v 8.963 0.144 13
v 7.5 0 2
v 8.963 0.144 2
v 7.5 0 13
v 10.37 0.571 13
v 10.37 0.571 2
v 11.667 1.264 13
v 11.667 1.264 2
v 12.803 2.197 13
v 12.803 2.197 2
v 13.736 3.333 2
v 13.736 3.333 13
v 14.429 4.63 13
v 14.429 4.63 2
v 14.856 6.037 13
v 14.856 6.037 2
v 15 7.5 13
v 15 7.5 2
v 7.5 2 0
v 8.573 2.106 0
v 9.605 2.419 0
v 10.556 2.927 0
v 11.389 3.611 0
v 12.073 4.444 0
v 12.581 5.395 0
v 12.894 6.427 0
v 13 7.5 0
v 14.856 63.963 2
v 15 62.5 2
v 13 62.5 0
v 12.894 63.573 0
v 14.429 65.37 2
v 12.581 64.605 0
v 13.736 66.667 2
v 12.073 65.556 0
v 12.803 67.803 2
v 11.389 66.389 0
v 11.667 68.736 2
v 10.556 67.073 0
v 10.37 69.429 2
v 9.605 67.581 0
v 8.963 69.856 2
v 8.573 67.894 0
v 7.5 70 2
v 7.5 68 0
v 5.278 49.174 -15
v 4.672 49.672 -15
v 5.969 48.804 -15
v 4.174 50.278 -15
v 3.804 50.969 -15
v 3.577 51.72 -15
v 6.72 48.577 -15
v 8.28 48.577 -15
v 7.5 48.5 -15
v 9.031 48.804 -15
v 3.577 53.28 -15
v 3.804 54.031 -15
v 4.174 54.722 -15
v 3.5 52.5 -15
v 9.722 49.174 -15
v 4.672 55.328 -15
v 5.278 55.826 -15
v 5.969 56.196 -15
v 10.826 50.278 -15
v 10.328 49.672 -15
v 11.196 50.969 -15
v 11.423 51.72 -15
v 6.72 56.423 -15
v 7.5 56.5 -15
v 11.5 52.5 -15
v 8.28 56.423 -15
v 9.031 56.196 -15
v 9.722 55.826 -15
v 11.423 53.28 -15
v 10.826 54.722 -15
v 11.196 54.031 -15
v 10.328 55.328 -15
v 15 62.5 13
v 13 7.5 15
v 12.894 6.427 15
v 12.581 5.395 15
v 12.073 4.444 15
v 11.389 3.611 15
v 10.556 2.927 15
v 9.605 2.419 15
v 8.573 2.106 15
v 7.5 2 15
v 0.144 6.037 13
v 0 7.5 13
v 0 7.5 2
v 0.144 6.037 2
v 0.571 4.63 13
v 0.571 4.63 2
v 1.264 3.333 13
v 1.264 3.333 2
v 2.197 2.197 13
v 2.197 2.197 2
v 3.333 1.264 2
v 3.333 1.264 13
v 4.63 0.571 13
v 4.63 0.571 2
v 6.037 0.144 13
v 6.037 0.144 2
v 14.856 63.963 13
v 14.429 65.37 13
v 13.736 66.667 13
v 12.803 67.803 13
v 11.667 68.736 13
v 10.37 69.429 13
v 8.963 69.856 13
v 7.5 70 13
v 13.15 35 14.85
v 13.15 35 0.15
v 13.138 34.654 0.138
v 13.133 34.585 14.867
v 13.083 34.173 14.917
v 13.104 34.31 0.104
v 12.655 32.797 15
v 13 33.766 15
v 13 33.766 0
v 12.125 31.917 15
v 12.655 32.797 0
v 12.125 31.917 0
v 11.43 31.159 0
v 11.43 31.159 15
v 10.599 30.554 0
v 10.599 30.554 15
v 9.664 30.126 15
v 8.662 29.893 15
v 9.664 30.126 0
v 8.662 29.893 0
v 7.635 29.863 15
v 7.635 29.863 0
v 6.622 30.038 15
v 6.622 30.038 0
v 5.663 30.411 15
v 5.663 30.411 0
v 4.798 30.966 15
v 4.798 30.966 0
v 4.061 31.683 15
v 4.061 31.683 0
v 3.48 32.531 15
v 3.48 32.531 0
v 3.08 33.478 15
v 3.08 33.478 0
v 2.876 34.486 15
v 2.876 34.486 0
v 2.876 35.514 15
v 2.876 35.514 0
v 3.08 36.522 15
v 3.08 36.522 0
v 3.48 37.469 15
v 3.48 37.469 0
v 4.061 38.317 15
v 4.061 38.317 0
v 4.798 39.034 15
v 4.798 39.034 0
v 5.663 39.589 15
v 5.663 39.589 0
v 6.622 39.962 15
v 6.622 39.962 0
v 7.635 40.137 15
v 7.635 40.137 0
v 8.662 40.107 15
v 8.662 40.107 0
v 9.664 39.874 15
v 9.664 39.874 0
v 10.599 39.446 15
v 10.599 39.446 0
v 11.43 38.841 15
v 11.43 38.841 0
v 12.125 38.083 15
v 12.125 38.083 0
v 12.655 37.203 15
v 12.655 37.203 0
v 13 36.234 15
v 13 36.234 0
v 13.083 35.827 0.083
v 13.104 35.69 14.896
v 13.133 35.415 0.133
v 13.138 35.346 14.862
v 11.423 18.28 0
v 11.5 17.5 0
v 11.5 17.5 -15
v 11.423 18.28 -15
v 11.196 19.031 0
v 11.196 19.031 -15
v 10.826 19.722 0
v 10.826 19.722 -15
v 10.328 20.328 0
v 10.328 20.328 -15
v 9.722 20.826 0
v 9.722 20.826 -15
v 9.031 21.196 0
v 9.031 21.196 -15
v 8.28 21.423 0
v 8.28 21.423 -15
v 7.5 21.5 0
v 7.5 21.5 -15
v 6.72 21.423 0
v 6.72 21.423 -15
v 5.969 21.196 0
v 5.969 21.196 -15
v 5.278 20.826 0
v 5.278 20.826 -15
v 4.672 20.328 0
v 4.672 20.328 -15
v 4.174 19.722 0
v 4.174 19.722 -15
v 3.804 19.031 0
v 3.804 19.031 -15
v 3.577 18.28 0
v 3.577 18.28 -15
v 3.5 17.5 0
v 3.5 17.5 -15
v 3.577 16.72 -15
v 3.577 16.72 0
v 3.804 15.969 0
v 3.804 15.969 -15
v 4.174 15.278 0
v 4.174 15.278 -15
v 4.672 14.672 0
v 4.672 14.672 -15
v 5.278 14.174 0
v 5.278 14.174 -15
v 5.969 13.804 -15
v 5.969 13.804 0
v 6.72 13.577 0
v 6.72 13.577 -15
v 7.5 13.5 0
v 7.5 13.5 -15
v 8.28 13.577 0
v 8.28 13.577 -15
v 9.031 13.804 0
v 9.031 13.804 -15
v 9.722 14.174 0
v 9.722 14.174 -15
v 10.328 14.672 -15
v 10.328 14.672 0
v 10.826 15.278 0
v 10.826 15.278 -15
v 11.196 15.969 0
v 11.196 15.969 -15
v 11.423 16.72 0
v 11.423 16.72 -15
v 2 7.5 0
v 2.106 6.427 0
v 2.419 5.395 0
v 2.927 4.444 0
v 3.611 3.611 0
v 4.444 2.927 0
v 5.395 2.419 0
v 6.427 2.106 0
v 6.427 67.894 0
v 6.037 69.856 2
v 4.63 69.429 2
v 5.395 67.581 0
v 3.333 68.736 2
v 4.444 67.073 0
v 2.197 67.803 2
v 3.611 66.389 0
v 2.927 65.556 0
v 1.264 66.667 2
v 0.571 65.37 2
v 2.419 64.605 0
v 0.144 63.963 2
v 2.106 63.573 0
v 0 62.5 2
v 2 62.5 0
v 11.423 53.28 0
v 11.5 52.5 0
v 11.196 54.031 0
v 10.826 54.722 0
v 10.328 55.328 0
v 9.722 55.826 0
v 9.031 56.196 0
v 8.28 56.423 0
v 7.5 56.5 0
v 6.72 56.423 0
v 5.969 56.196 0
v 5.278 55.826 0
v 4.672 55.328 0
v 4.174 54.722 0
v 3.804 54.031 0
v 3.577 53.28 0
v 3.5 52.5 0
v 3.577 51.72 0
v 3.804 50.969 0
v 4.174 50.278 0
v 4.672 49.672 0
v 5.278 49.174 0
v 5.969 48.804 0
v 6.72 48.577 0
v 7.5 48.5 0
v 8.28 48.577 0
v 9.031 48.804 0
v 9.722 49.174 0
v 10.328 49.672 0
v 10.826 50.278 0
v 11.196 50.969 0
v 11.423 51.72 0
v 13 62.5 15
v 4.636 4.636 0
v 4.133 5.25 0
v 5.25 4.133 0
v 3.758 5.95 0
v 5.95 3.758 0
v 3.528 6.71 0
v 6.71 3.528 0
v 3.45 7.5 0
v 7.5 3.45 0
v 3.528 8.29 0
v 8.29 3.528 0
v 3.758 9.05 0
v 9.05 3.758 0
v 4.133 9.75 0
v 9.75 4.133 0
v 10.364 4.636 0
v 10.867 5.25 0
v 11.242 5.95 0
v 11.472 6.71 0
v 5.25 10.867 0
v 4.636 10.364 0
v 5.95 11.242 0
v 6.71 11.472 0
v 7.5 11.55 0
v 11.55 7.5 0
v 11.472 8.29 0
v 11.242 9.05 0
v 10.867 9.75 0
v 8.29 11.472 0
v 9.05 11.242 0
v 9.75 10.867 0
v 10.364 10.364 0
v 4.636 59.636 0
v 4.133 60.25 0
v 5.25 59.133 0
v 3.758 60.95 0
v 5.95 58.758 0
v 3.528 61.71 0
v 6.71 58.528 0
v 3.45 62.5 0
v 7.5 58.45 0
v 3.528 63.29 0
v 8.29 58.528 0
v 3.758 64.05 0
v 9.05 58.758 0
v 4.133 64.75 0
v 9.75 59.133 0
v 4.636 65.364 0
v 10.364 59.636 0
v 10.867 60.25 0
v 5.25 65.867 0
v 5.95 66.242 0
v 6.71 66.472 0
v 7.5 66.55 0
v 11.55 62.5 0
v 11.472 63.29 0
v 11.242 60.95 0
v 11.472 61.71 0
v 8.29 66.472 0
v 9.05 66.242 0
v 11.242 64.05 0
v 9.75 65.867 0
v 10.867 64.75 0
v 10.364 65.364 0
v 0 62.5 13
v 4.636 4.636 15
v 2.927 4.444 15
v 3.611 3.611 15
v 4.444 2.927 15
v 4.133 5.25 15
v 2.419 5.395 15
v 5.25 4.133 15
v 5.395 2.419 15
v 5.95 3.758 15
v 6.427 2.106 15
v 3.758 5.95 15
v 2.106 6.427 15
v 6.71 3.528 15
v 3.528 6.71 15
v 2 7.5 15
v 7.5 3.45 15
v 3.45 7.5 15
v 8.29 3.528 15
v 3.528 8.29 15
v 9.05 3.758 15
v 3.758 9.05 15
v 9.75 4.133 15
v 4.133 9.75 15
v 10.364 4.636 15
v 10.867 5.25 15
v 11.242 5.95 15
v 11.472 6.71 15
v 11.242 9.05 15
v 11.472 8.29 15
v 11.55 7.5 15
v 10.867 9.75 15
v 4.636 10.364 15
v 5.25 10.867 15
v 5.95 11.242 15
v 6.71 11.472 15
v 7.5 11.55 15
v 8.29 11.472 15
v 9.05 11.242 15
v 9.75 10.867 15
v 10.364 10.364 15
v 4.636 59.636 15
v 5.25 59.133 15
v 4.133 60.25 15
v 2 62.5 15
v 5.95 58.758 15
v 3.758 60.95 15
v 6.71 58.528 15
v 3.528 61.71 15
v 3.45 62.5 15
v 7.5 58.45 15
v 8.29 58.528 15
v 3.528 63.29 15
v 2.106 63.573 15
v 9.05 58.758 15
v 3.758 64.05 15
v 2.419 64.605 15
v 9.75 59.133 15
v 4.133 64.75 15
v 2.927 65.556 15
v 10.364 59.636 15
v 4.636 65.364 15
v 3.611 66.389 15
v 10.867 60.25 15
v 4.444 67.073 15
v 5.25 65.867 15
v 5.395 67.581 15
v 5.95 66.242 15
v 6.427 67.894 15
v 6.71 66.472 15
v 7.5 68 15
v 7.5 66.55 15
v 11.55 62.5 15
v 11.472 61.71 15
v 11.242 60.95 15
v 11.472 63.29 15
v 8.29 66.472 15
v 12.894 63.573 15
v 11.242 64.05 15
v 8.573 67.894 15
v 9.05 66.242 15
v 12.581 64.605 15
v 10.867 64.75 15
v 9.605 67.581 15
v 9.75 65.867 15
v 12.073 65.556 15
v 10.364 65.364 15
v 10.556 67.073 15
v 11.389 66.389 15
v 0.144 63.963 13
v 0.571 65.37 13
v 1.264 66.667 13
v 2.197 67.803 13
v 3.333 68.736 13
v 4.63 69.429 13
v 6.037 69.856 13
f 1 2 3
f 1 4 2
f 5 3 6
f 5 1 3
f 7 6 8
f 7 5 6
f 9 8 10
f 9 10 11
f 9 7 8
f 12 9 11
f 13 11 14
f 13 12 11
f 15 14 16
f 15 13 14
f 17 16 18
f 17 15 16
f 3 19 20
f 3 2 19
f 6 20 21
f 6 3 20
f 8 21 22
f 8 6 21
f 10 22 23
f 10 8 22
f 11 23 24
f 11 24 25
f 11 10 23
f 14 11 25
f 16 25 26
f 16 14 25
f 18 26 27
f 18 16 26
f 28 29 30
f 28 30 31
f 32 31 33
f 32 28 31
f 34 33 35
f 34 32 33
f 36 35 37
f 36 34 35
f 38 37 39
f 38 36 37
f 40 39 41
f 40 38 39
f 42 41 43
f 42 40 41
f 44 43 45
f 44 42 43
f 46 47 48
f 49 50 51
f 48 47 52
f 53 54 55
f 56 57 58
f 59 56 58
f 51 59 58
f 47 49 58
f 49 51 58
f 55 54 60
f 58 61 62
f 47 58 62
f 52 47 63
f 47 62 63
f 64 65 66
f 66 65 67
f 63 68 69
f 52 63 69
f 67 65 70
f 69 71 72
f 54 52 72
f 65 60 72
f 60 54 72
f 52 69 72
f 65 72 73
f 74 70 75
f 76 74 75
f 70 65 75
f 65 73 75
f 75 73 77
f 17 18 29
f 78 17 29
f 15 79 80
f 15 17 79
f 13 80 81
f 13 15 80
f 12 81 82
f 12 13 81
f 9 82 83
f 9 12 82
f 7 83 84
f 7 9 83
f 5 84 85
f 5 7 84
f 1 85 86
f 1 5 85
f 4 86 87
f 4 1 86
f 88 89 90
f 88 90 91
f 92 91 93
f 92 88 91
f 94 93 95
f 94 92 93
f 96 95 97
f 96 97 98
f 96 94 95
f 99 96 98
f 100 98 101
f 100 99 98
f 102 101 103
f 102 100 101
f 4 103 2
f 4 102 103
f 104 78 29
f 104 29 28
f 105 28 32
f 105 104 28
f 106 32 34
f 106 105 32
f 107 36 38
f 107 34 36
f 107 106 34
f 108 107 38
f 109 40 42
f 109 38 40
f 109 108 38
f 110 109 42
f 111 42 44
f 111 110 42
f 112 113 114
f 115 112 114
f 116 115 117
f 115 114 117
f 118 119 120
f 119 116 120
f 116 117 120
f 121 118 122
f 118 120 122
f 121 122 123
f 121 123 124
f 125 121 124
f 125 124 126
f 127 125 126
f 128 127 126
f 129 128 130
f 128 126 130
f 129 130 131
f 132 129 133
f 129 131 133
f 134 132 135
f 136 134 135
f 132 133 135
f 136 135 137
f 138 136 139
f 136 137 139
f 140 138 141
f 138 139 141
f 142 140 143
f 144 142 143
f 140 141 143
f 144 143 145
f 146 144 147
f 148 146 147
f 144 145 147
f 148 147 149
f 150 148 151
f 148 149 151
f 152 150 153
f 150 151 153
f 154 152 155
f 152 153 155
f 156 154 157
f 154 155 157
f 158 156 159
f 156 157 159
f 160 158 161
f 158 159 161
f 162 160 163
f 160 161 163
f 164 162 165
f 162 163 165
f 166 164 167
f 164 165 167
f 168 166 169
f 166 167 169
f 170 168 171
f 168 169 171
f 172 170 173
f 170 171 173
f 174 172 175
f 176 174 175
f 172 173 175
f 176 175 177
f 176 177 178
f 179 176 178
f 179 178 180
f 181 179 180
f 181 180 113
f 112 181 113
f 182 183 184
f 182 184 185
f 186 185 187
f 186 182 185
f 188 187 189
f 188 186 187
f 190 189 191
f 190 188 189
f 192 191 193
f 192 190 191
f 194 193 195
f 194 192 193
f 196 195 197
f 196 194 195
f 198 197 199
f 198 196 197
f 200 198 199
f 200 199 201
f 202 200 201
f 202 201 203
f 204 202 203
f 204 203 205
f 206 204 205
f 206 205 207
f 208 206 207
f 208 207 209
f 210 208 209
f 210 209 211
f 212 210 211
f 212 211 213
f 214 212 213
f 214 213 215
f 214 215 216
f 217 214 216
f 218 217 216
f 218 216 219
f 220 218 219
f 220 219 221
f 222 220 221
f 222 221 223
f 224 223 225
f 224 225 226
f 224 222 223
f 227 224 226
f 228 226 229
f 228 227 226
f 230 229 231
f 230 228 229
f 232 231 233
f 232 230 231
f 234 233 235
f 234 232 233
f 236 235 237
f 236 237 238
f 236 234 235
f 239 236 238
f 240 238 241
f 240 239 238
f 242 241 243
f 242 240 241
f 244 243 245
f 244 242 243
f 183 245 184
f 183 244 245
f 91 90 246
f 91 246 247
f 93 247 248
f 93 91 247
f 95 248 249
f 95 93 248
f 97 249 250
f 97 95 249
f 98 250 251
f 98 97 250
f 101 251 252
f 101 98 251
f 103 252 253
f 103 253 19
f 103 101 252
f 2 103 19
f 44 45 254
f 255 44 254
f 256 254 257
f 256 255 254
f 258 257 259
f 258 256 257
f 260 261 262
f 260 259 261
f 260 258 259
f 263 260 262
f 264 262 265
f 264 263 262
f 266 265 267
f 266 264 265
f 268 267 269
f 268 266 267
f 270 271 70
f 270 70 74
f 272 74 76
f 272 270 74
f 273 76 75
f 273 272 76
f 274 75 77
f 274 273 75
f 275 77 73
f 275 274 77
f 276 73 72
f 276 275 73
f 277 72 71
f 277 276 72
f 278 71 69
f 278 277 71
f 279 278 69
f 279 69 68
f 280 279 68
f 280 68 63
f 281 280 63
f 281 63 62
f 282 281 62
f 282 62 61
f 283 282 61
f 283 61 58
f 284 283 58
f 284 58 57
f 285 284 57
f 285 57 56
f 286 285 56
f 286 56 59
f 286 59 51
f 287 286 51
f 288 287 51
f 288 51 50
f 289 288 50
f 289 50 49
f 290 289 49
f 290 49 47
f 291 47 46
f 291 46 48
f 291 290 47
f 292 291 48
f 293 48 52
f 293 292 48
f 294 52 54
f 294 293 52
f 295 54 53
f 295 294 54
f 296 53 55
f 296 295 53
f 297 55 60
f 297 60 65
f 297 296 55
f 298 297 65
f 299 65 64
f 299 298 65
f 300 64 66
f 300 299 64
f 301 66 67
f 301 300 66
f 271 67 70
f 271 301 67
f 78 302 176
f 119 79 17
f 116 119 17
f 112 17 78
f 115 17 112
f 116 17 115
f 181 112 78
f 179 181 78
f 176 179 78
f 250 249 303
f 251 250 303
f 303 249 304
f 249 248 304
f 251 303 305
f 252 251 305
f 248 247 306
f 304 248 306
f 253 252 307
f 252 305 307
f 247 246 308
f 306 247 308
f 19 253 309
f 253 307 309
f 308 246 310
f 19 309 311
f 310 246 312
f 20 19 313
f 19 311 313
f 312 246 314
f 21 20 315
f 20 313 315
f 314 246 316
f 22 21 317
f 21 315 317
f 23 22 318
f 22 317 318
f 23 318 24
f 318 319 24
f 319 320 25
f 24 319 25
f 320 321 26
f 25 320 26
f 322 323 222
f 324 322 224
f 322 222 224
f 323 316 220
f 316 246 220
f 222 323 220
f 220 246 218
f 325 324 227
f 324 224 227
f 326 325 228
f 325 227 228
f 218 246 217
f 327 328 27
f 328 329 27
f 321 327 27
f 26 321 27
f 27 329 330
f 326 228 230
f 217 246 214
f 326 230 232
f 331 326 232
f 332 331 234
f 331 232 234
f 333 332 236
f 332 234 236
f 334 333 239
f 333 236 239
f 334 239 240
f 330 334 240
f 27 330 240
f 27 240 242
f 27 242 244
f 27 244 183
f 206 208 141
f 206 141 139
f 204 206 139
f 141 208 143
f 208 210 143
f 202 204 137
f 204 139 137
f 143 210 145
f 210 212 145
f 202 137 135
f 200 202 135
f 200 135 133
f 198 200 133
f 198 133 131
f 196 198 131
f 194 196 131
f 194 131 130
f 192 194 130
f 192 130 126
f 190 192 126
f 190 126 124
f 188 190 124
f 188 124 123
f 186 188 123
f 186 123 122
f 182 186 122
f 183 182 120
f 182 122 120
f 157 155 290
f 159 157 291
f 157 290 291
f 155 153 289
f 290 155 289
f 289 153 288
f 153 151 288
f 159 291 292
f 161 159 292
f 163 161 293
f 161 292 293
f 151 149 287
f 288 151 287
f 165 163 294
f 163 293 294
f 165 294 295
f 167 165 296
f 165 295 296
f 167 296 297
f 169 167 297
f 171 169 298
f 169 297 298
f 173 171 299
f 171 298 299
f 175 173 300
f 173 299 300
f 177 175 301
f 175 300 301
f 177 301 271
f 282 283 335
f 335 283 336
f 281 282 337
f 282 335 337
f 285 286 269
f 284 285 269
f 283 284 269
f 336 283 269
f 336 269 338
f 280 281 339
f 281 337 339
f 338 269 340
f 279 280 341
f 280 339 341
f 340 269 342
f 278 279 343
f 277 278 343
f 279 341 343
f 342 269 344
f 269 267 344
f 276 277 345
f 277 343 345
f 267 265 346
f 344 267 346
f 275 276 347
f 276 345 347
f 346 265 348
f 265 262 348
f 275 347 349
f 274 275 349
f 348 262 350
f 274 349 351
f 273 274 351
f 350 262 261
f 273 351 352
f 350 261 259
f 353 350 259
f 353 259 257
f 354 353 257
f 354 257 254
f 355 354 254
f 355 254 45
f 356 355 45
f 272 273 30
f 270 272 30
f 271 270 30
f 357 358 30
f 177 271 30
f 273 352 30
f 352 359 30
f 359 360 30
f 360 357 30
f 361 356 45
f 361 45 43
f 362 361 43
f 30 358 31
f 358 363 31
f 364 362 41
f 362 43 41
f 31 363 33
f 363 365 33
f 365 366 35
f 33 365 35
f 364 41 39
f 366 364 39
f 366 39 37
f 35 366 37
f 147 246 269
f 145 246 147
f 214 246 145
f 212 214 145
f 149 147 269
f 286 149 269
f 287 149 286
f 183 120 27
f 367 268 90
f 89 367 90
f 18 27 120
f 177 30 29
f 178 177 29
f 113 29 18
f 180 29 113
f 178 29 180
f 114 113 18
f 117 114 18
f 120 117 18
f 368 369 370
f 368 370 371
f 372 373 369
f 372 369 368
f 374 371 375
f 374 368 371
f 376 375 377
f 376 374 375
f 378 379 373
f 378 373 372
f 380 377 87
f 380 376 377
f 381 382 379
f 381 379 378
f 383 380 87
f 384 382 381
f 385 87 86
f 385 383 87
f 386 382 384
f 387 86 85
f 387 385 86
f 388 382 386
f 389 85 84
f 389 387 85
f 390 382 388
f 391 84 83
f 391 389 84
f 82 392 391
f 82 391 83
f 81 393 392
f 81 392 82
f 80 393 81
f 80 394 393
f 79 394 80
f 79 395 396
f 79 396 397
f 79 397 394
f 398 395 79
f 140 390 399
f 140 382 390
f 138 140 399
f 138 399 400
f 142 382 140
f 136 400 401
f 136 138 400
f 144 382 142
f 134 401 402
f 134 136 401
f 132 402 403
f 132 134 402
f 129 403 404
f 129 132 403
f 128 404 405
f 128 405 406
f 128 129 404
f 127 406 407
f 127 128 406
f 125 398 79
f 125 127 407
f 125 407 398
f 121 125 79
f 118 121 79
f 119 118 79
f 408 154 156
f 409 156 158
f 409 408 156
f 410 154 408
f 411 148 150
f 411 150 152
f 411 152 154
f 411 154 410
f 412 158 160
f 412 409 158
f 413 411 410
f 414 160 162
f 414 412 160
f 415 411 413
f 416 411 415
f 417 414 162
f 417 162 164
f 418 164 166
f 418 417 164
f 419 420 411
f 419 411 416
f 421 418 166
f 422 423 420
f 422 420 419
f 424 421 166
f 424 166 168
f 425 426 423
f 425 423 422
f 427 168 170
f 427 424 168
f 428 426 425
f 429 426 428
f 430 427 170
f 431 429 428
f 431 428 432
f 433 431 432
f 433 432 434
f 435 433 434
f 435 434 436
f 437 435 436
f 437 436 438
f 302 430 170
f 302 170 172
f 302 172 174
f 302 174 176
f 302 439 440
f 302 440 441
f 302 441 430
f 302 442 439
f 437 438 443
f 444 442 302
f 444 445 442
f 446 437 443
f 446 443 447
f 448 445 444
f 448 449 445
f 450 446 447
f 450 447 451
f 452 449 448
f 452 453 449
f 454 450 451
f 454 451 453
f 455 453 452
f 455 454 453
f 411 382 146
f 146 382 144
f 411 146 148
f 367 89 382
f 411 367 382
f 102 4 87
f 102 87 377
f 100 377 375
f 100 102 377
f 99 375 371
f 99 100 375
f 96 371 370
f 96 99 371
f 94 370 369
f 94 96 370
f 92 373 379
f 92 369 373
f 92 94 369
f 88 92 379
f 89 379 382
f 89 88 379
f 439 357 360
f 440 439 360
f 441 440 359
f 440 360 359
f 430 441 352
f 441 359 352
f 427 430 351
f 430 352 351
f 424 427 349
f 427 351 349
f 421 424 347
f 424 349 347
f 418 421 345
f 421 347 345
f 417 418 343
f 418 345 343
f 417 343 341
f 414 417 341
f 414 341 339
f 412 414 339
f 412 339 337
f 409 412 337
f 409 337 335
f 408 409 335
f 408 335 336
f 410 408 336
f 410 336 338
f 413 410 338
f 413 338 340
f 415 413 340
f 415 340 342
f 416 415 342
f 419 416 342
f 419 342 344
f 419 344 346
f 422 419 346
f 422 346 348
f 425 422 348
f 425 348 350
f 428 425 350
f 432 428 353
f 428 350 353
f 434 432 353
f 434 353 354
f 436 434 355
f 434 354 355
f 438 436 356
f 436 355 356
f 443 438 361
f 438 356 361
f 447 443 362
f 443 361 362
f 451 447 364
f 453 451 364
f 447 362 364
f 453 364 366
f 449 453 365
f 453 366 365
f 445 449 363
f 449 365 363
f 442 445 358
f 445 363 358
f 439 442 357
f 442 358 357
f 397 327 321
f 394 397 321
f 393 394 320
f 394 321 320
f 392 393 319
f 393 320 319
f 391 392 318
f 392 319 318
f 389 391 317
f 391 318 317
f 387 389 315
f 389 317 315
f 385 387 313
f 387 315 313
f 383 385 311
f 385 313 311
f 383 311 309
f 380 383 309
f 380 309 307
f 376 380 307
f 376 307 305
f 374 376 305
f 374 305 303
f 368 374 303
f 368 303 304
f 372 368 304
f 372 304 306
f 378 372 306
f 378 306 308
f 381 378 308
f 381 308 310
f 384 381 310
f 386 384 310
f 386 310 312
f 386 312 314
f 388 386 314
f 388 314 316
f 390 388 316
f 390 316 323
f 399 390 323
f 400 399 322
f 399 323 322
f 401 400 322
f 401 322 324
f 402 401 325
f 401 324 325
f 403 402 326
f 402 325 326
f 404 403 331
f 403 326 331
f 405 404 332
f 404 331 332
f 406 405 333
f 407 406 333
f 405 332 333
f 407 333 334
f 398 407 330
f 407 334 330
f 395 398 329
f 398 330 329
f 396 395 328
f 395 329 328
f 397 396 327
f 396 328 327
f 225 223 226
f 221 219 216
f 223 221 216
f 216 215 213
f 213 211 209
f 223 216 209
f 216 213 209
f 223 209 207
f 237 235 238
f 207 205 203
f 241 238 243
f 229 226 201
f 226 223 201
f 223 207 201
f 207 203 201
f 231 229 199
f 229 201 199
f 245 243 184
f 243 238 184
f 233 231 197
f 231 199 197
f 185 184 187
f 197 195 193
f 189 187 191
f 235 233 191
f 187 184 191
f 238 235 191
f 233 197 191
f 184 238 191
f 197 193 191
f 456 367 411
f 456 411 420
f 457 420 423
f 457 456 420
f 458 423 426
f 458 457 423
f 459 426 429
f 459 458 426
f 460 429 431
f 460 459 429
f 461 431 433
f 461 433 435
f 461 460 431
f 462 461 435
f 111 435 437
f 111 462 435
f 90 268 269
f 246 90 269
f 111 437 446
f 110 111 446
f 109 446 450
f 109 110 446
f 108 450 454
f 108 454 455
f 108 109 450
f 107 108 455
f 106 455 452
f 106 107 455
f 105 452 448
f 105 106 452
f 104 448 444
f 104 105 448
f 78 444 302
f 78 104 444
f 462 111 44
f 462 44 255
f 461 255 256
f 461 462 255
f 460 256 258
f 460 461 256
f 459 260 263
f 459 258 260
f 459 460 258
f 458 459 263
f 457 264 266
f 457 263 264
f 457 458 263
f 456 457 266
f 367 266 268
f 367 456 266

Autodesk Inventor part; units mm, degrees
ref_plane "YZ Plane" through (0, 0, 0) normal (1, 0, 0) x (0, 1, 0)
ref_plane "XZ Plane" through (0, 0, 0) normal (0, 1, 0) x (-1, 0, 0)
ref_plane "XY Plane" through (0, 0, 0) normal (0, 0, 1) x (1, 0, 0)
sketch "Sketch1" plane through (0, 0, 0) normal (0, 0, 1) x (1, 0, 0)
  line L0 (0, 0) -> (15, 0)
  line L1 (15, 0) -> (15, 70)
  line L2 (15, 70) -> (0, 70)
  line L3 (0, 70) -> (0, 0)
  line L4 (15, 35) -> (0, 35)
  line L5 (0, 60) -> (15, 60)
  line L6 (15, 60) -> (15, 10)
  line L7 (15, 10) -> (0, 10)
  line L8 (0, 10) -> (0, 60)
  line L9 (0, 60) -> (15, 10) construction
  line L10 (15, 60) -> (0, 10) construction
  line L11 (7.5, 35) -> (8, 35)
  circle A0 centre (8, 35) radius 5.15
  line L12 (0, 0) -> (15, 0)
  line L13 (15, 0) -> (15, 15)
  line L14 (15, 15) -> (0, 15) construction
  line L15 (0, 15) -> (0, 0)
  line L16 (0, 70) -> (15, 70)
  line L17 (15, 70) -> (15, 55)
  line L18 (15, 55) -> (0, 55) construction
  line L19 (0, 55) -> (0, 70)
  line L20 (15, 15) -> (0, 0) construction
  line L21 (0, 70) -> (15, 55) construction
  circle A1 centre (7.5, 7.5) radius 7.5
  circle A2 centre (7.5, 62.5) radius 7.5
  line L22 (0, 10) -> (15, 10)
  line L23 (15, 10) -> (15, 25)
  line L24 (15, 25) -> (0, 25)
  line L25 (0, 25) -> (0, 10)
  line L26 (15, 60) -> (0, 60)
  line L27 (0, 60) -> (0, 45)
  line L28 (0, 45) -> (15, 45)
  line L29 (15, 45) -> (15, 60)
  line L30 (0, 45) -> (15, 60) construction
  line L31 (0, 10) -> (15, 25) construction
  circle A3 centre (7.5, 17.5) radius 4
  circle A4 centre (7.5, 52.5) radius 4
  circle A5 centre (7.5, 7.5) radius 4.05
  circle A6 centre (7.5, 62.5) radius 4.05
  point P0 (15, 7.5)
  point P1 (15, 62.5)
  point P2 (0, 62.5)
  point P3 (0, 7.5)
  point P4 (7.5, 70)
  point P5 (7.5, 0)
  dimension "d0" = 15
  dimension "d1" = 70
  dimension "d2" = 15
  dimension "d3" = 50
  dimension "d5" = 0.5
  dimension "d6" = 10.3
  dimension "d7" = 15
  dimension "d8" = 15
  dimension "d9" = 15
  dimension "d10" = 15
  dimension "d11" = 15
  dimension "d12" = 15
  dimension "d13" = 15
  dimension "d14" = 15
  dimension "d15" = 8
  dimension "d16" = 8
  dimension "d26" = 8.1
  dimension "d27" = 8.1
extrude "Extrusion1" add sketch "Sketch1" against normal blind 15 contours A3 A1 | A1 A3 | A4 A2 | A2 A4
extrude "Extrusion2" add sketch "Sketch1" along normal blind 15 contours L3 A1 L0 | A1 L1 L0 | A1 L7 A5 | L3 L7 A1 | A1 L7 L1 | L3 L24 L1 L7 A1 A3 | A1 A3 L7 A5 | A3 A1 | A1 A3 | L3 L4 A0 L1 L24 | L3 L28 L1 L4 A0 | L3 L5 A2 A4 L1 L28 | L3 A2 L5 | L5 A2 L1 | L3 L2 A2 | A2 L5 A6 | L5 A6 A2 A4 | A2 L2 L1 | A4 A2 | A2 A4
fillet "Fillet2" radius 7.5 4 edges at (15, 0, 7.5) (0, 0, 7.5) (15, 70, 7.5) (0, 70, 7.5)
chamfer "Chamfer2" distance 2 angle 45 12 edges at (12.8033, 67.8033, 15) (12.8033, 2.1967, 15) (2.1967, 67.8033, 15) (2.1967, 2.1967, 15) (0, 35, 15) (15, 35, 15) (15, 35, 0) (12.8033, 67.8033, 0) (12.8033, 2.1967, 0) (2.1967, 67.8033, 0) (2.1967, 2.1967, 0) (0, 35, 0)
properties part number "Gear_Holder_1"
